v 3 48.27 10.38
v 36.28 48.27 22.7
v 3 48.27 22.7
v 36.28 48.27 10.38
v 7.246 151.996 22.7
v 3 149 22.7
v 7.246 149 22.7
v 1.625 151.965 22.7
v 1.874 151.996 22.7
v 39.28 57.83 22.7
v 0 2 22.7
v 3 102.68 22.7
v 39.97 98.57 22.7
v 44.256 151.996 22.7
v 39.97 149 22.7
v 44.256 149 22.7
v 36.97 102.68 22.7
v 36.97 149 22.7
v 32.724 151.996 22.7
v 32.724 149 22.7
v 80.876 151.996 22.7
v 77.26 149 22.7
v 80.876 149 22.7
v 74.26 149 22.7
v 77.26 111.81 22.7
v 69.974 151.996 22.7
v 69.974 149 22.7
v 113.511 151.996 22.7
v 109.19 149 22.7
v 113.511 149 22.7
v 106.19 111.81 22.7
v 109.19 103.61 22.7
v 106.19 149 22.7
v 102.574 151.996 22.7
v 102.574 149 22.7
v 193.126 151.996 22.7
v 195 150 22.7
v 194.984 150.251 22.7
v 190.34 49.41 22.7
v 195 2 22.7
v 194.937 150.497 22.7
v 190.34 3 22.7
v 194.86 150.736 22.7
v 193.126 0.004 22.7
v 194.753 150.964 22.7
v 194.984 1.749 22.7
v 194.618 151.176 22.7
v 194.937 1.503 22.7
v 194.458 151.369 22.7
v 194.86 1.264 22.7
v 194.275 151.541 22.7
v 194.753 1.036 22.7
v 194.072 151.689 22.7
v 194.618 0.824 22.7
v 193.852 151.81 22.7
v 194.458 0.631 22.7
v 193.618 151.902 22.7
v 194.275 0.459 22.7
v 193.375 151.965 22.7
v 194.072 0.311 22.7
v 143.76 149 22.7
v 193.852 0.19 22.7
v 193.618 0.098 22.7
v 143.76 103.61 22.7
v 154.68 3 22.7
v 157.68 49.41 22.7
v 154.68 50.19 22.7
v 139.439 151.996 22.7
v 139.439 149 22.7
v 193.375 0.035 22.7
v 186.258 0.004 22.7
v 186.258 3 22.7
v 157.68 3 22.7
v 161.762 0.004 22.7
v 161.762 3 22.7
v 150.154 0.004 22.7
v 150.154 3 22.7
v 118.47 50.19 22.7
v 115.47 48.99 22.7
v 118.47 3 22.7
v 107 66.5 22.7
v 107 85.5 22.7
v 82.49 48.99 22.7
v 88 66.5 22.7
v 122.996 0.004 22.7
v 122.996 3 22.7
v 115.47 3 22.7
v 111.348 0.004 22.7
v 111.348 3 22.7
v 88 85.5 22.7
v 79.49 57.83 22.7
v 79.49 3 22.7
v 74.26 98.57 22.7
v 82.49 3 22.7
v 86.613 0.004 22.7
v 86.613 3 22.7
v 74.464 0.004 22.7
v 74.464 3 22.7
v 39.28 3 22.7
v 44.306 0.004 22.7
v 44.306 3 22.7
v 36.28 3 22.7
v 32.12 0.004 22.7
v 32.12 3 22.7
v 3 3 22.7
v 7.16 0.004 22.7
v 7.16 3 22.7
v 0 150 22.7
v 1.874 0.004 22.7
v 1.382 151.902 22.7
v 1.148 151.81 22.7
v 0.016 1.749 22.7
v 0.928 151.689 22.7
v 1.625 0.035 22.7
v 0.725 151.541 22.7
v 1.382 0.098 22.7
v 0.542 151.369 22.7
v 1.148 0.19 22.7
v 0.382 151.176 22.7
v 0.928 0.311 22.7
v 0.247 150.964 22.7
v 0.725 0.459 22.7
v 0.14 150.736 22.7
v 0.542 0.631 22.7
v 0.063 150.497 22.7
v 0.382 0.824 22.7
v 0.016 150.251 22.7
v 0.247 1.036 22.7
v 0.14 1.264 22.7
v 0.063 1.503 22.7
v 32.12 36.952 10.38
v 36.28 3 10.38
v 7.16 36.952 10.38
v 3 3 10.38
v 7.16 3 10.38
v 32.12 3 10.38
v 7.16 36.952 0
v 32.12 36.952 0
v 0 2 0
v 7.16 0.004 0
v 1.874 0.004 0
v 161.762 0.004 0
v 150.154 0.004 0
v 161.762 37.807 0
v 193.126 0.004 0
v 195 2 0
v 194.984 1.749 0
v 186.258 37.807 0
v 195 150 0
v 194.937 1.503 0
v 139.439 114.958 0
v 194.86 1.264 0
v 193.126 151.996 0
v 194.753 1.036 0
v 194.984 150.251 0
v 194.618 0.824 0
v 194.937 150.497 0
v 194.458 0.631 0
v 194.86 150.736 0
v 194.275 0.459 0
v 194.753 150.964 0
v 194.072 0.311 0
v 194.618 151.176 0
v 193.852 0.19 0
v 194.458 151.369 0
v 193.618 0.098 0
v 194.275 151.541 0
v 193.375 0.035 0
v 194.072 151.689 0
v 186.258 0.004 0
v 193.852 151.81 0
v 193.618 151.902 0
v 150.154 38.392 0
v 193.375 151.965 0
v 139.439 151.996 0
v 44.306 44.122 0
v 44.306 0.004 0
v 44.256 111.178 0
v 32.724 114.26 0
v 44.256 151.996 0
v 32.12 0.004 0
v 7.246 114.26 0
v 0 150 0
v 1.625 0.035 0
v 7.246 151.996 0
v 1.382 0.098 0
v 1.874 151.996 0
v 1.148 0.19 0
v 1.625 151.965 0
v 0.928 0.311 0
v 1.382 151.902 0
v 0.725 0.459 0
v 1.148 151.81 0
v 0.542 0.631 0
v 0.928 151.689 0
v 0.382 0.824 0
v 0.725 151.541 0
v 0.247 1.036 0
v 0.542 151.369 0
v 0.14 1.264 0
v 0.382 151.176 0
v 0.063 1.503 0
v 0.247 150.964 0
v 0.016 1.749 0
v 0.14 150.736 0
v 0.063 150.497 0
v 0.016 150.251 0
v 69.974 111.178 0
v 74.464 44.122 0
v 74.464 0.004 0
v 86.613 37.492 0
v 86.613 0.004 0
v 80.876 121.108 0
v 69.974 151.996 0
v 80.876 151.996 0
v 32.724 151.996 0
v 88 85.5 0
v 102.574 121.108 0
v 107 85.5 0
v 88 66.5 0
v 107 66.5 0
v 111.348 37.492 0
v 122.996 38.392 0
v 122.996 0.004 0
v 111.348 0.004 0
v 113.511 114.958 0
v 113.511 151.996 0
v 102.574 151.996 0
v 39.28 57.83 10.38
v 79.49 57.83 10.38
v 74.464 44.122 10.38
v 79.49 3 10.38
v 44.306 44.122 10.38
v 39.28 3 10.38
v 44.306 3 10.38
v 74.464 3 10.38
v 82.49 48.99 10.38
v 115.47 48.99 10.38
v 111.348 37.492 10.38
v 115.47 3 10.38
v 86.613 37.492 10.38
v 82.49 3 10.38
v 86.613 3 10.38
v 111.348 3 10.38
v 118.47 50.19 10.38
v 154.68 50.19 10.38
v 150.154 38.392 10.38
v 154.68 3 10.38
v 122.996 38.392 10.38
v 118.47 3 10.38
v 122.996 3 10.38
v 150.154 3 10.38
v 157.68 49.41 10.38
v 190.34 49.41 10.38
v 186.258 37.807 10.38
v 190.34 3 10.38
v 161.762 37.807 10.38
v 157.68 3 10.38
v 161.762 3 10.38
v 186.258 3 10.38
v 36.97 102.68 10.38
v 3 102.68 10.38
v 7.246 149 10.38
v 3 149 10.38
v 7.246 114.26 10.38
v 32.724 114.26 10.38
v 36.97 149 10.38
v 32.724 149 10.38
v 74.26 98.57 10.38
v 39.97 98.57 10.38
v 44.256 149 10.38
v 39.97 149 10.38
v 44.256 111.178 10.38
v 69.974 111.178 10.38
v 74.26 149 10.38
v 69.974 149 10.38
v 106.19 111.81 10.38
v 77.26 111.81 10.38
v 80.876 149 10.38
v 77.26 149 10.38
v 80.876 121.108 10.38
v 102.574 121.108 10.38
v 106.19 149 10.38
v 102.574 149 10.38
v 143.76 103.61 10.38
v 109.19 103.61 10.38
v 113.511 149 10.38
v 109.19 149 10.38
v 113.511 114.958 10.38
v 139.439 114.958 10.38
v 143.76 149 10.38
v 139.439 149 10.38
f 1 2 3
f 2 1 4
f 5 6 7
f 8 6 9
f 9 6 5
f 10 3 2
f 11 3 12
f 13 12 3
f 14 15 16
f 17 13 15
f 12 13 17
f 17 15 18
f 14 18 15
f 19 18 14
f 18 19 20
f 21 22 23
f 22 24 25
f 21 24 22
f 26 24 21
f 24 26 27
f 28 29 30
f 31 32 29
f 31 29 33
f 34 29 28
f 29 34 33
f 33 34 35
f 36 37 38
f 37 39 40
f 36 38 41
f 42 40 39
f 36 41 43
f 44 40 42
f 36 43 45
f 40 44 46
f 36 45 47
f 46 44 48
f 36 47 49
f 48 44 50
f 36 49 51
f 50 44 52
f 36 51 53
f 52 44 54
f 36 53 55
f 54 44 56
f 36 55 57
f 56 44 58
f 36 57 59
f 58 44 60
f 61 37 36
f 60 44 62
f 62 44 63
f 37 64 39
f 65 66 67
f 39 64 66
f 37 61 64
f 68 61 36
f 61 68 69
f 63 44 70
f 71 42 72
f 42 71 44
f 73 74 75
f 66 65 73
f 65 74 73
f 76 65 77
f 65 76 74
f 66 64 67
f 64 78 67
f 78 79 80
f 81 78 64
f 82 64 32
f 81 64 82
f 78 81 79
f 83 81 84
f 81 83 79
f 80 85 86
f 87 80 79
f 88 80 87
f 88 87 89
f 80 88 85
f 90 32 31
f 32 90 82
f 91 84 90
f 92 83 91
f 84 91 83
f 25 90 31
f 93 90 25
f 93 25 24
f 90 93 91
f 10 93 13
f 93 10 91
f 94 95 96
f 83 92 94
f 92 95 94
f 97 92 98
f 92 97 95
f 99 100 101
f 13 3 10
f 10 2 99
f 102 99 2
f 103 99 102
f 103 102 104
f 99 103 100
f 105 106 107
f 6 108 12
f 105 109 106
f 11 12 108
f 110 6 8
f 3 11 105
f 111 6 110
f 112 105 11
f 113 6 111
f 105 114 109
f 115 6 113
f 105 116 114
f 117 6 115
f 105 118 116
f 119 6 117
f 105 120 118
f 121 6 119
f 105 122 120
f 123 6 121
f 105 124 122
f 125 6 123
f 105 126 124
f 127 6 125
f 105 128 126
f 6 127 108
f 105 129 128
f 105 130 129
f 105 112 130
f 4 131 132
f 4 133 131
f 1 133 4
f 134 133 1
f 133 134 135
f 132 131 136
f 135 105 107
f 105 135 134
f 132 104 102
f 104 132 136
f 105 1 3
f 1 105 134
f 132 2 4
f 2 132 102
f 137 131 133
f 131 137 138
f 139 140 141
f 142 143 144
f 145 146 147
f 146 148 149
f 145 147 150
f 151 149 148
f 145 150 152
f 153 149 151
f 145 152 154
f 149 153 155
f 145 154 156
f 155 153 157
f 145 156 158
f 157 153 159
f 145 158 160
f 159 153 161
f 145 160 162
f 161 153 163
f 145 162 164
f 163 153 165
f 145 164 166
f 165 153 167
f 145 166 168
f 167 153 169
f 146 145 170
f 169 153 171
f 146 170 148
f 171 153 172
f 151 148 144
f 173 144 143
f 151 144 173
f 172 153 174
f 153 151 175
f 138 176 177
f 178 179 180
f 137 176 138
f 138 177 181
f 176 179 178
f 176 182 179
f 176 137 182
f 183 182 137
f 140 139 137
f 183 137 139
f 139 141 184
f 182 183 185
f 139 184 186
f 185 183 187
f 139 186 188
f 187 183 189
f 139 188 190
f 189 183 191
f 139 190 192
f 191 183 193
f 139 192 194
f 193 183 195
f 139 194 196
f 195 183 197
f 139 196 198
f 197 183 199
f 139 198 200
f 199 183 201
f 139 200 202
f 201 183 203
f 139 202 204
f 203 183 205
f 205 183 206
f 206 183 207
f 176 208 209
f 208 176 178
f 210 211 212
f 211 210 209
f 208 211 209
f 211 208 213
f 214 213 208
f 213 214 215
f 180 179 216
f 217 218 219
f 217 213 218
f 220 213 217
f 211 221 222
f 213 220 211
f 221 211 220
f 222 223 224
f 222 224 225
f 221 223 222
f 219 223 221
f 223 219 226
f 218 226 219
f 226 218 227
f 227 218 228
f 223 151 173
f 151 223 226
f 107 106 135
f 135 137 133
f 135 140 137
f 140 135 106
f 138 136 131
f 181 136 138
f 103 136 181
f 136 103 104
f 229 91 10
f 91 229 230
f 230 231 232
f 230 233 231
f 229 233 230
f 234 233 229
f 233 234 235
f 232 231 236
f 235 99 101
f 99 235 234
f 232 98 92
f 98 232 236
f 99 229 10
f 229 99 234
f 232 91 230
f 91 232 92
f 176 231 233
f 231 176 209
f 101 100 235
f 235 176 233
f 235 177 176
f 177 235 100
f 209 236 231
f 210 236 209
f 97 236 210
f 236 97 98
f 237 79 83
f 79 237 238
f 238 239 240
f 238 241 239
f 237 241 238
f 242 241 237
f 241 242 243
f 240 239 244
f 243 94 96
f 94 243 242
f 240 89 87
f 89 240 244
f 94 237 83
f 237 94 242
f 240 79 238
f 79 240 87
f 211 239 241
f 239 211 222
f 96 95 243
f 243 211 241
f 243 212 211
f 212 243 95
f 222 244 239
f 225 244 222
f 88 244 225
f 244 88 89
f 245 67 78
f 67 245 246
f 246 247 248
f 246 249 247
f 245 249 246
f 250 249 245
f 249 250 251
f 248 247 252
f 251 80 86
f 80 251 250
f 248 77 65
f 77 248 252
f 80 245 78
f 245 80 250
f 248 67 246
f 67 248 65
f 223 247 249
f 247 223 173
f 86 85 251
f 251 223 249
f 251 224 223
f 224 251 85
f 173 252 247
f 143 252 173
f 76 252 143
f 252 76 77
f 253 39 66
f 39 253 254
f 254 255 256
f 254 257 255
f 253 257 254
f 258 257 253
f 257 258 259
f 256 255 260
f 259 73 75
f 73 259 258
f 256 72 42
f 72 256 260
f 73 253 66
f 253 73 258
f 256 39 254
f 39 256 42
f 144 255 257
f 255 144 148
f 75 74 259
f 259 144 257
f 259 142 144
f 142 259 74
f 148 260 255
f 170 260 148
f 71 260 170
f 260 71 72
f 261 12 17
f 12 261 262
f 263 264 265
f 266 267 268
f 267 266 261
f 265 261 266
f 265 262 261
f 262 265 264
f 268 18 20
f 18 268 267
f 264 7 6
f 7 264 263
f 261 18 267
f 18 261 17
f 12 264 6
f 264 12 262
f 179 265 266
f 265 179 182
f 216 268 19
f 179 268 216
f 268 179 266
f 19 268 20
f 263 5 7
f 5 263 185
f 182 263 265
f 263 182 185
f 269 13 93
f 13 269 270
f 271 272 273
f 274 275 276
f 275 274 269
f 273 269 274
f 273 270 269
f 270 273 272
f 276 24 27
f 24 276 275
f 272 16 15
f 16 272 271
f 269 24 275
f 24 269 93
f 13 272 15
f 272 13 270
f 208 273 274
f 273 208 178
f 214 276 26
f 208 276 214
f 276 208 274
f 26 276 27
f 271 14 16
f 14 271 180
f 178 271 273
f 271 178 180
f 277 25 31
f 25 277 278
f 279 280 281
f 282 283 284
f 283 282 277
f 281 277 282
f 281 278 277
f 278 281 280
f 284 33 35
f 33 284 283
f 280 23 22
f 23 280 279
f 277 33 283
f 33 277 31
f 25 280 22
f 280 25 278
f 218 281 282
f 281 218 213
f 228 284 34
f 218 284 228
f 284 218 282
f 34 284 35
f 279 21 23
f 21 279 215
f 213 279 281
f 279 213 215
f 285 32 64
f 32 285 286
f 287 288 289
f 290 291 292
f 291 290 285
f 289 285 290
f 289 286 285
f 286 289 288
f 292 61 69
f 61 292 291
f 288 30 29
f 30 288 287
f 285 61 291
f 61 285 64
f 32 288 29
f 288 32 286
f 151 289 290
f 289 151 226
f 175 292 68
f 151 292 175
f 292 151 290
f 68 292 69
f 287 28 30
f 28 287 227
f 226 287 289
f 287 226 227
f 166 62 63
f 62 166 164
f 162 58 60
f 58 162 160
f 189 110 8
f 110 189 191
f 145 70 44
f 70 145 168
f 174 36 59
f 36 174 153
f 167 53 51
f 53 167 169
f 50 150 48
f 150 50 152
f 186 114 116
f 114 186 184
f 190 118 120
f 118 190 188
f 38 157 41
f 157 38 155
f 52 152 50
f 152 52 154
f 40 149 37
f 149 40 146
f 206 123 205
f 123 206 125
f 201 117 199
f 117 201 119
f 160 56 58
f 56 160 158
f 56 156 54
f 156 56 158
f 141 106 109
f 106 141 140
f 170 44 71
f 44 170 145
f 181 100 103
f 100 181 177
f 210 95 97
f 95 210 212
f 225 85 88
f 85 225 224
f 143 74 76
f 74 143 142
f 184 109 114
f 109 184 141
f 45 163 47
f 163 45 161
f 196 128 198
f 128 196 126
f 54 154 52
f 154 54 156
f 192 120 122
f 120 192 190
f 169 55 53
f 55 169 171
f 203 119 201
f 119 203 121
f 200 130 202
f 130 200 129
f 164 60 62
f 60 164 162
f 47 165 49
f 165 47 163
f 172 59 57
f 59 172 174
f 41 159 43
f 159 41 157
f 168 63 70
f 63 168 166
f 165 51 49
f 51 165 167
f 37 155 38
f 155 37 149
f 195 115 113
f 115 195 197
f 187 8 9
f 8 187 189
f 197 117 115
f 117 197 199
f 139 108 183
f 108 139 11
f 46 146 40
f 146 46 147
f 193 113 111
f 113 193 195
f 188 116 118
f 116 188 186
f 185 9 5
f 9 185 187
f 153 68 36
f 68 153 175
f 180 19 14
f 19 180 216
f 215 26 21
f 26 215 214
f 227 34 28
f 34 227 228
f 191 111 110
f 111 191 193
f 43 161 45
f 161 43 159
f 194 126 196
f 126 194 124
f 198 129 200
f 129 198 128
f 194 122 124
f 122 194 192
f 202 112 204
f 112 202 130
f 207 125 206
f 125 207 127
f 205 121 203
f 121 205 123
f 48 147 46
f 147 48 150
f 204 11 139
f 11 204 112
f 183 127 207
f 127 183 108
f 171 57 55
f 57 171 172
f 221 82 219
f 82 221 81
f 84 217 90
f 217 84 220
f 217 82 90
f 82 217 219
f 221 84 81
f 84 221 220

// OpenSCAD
// file: SquarePileLib.scad
module LeftPile(wallThickness, totalHeight, singlePileHeight, singlePileWidth, singlePileLength, pileCount, openingSizePercent = .75){
    pileHeight = (pileCount * singlePileHeight) + .5;
    lengthOpeningSize = singlePileLength * openingSizePercent;
    widthOpeningSize = singlePileWidth * openingSizePercent;
    blockerSize = (singlePileWidth - widthOpeningSize) / 2;
    
    translate([wallThickness, wallThickness, totalHeight - pileHeight])
        cube([singlePileLength, singlePileWidth, pileHeight]);
    translate([-.00001, wallThickness + (blockerSize), 0])
        cube([wallThickness + lengthOpeningSize, widthOpeningSize, totalHeight]);
}

module RightPile(wallThickness, totalHeight, singlePileHeight, singlePileWidth, singlePileLength, pileCount, openingSizePercent = .75){
    translate([0, wallThickness + wallThickness + singlePileWidth, 0])
        rotate([0, 0, 180])
            LeftPile(wallThickness, totalHeight, singlePileHeight, singlePileWidth, singlePileLength, pileCount, openingSizePercent);
}

module BottomPile(wallThickness, totalHeight, singlePileHeight, singlePileWidth, singlePileLength, pileCount, openingSizePercent = .75){
    translate([wallThickness + wallThickness + singlePileWidth, 0, 0])
        rotate([0, 0, 90])
            LeftPile(wallThickness, totalHeight, singlePileHeight, singlePileWidth, singlePileLength, pileCount, openingSizePercent);
}

module TopPile(wallThickness, totalHeight, singlePileHeight, singlePileWidth, singlePileLength, pileCount, openingSizePercent = .75){
        rotate([0, 0, 270])
            LeftPile(wallThickness, totalHeight, singlePileHeight, singlePileWidth, singlePileLength, pileCount, openingSizePercent);
}
// main file
include<SquarePileLib.scad>

length = 195;

magnetHoleWidth = 19;
wallThickness = 3;
singlePileHeight = 1.97;
maxTokenHeight = 62;
maxTokenCount = 10;
width = wallThickness + maxTokenHeight + wallThickness + magnetHoleWidth + maxTokenHeight + wallThickness;
height = wallThickness + (maxTokenCount * singlePileHeight);

token1Width = 32.28 + 1;
token1Height = 44.27 + 1;
token1Count = 6;
token2Width = 39.21 + 1;
token2Height = 53.83 + 1;
token2Count = 6;
token3Width = 31.98 + 1;
token3Height = 44.99 + 1;
token3Count = 6;
token4Width = 35.21 + 1;
token4Height = 46.19 + 1;
token4Count = 6;
token5Width = 31.66 + 1;
token5Height = 45.41 + 1;
token5Count = 6;
token6Width = 32.97 + 1;
token6Height = 45.32 + 1;
token6Count = 6;
token7Width = 33.29 + 1;
token7Height = 49.43 + 1;
token7Count = 6;
token8Width = 27.93 + 1;
token8Height = 36.19 + 1;
token8Count = 6;
token9Width = 33.57 + 1;
token9Height = 44.39 + 1;
token9Count = 6;


difference() {

    $fn=50;
    minkowski()
    {
      translate([2,2,0])
        cube([length-4, width-4, height - 1]);
      cylinder(r=2,h=1);
    }
    translate([0, 0, 0])
        BottomPile(
            wallThickness,
            height,
            singlePileHeight,
            token1Width,
            token1Height,
            token1Count
        );
    translate([token1Width + wallThickness, 0, 0])
        BottomPile(
            wallThickness,
            height,
            singlePileHeight,
            token2Width,
            token2Height,
            token2Count
        );
    translate([token1Width + token2Width + wallThickness * 2, 0, 0])
        BottomPile(
            wallThickness,
            height,
            singlePileHeight,
            token3Width,
            token3Height,
            token3Count
        );
    translate([token1Width + token2Width + token3Width + wallThickness * 3, 0, 0])
        BottomPile(
            wallThickness,
            height,
            singlePileHeight,
            token4Width,
            token4Height,
            token4Count
        );
    translate([token1Width + token2Width + token3Width + token4Width + wallThickness * 4, 0, 0])
        BottomPile(
            wallThickness,
            height,
            singlePileHeight,
            token5Width,
            token5Height,
            token5Count
        );
    
    translate([0, width, 0])
        TopPile(
            wallThickness,
            height,
            singlePileHeight,
            token6Width,
            token6Height,
            token6Count
        );
    translate([token6Width + wallThickness, width, 0])
        TopPile(
            wallThickness,
            height,
            singlePileHeight,
            token7Width,
            token7Height,
            token7Count
        );
    translate([token6Width + token7Width + wallThickness * 2, width, 0])
        TopPile(
            wallThickness,
            height,
            singlePileHeight,
            token8Width,
            token8Height,
            token8Count
        );
    translate([token6Width + token7Width + token8Width + wallThickness * 3, width, 0])
        TopPile(
            wallThickness,
            height,
            singlePileHeight,
            token9Width,
            token9Height,
            token9Count
        );

    
    translate([length/2 - magnetHoleWidth/2, width/2 - magnetHoleWidth/2, 0])
        cube([magnetHoleWidth, magnetHoleWidth, height]);
}
